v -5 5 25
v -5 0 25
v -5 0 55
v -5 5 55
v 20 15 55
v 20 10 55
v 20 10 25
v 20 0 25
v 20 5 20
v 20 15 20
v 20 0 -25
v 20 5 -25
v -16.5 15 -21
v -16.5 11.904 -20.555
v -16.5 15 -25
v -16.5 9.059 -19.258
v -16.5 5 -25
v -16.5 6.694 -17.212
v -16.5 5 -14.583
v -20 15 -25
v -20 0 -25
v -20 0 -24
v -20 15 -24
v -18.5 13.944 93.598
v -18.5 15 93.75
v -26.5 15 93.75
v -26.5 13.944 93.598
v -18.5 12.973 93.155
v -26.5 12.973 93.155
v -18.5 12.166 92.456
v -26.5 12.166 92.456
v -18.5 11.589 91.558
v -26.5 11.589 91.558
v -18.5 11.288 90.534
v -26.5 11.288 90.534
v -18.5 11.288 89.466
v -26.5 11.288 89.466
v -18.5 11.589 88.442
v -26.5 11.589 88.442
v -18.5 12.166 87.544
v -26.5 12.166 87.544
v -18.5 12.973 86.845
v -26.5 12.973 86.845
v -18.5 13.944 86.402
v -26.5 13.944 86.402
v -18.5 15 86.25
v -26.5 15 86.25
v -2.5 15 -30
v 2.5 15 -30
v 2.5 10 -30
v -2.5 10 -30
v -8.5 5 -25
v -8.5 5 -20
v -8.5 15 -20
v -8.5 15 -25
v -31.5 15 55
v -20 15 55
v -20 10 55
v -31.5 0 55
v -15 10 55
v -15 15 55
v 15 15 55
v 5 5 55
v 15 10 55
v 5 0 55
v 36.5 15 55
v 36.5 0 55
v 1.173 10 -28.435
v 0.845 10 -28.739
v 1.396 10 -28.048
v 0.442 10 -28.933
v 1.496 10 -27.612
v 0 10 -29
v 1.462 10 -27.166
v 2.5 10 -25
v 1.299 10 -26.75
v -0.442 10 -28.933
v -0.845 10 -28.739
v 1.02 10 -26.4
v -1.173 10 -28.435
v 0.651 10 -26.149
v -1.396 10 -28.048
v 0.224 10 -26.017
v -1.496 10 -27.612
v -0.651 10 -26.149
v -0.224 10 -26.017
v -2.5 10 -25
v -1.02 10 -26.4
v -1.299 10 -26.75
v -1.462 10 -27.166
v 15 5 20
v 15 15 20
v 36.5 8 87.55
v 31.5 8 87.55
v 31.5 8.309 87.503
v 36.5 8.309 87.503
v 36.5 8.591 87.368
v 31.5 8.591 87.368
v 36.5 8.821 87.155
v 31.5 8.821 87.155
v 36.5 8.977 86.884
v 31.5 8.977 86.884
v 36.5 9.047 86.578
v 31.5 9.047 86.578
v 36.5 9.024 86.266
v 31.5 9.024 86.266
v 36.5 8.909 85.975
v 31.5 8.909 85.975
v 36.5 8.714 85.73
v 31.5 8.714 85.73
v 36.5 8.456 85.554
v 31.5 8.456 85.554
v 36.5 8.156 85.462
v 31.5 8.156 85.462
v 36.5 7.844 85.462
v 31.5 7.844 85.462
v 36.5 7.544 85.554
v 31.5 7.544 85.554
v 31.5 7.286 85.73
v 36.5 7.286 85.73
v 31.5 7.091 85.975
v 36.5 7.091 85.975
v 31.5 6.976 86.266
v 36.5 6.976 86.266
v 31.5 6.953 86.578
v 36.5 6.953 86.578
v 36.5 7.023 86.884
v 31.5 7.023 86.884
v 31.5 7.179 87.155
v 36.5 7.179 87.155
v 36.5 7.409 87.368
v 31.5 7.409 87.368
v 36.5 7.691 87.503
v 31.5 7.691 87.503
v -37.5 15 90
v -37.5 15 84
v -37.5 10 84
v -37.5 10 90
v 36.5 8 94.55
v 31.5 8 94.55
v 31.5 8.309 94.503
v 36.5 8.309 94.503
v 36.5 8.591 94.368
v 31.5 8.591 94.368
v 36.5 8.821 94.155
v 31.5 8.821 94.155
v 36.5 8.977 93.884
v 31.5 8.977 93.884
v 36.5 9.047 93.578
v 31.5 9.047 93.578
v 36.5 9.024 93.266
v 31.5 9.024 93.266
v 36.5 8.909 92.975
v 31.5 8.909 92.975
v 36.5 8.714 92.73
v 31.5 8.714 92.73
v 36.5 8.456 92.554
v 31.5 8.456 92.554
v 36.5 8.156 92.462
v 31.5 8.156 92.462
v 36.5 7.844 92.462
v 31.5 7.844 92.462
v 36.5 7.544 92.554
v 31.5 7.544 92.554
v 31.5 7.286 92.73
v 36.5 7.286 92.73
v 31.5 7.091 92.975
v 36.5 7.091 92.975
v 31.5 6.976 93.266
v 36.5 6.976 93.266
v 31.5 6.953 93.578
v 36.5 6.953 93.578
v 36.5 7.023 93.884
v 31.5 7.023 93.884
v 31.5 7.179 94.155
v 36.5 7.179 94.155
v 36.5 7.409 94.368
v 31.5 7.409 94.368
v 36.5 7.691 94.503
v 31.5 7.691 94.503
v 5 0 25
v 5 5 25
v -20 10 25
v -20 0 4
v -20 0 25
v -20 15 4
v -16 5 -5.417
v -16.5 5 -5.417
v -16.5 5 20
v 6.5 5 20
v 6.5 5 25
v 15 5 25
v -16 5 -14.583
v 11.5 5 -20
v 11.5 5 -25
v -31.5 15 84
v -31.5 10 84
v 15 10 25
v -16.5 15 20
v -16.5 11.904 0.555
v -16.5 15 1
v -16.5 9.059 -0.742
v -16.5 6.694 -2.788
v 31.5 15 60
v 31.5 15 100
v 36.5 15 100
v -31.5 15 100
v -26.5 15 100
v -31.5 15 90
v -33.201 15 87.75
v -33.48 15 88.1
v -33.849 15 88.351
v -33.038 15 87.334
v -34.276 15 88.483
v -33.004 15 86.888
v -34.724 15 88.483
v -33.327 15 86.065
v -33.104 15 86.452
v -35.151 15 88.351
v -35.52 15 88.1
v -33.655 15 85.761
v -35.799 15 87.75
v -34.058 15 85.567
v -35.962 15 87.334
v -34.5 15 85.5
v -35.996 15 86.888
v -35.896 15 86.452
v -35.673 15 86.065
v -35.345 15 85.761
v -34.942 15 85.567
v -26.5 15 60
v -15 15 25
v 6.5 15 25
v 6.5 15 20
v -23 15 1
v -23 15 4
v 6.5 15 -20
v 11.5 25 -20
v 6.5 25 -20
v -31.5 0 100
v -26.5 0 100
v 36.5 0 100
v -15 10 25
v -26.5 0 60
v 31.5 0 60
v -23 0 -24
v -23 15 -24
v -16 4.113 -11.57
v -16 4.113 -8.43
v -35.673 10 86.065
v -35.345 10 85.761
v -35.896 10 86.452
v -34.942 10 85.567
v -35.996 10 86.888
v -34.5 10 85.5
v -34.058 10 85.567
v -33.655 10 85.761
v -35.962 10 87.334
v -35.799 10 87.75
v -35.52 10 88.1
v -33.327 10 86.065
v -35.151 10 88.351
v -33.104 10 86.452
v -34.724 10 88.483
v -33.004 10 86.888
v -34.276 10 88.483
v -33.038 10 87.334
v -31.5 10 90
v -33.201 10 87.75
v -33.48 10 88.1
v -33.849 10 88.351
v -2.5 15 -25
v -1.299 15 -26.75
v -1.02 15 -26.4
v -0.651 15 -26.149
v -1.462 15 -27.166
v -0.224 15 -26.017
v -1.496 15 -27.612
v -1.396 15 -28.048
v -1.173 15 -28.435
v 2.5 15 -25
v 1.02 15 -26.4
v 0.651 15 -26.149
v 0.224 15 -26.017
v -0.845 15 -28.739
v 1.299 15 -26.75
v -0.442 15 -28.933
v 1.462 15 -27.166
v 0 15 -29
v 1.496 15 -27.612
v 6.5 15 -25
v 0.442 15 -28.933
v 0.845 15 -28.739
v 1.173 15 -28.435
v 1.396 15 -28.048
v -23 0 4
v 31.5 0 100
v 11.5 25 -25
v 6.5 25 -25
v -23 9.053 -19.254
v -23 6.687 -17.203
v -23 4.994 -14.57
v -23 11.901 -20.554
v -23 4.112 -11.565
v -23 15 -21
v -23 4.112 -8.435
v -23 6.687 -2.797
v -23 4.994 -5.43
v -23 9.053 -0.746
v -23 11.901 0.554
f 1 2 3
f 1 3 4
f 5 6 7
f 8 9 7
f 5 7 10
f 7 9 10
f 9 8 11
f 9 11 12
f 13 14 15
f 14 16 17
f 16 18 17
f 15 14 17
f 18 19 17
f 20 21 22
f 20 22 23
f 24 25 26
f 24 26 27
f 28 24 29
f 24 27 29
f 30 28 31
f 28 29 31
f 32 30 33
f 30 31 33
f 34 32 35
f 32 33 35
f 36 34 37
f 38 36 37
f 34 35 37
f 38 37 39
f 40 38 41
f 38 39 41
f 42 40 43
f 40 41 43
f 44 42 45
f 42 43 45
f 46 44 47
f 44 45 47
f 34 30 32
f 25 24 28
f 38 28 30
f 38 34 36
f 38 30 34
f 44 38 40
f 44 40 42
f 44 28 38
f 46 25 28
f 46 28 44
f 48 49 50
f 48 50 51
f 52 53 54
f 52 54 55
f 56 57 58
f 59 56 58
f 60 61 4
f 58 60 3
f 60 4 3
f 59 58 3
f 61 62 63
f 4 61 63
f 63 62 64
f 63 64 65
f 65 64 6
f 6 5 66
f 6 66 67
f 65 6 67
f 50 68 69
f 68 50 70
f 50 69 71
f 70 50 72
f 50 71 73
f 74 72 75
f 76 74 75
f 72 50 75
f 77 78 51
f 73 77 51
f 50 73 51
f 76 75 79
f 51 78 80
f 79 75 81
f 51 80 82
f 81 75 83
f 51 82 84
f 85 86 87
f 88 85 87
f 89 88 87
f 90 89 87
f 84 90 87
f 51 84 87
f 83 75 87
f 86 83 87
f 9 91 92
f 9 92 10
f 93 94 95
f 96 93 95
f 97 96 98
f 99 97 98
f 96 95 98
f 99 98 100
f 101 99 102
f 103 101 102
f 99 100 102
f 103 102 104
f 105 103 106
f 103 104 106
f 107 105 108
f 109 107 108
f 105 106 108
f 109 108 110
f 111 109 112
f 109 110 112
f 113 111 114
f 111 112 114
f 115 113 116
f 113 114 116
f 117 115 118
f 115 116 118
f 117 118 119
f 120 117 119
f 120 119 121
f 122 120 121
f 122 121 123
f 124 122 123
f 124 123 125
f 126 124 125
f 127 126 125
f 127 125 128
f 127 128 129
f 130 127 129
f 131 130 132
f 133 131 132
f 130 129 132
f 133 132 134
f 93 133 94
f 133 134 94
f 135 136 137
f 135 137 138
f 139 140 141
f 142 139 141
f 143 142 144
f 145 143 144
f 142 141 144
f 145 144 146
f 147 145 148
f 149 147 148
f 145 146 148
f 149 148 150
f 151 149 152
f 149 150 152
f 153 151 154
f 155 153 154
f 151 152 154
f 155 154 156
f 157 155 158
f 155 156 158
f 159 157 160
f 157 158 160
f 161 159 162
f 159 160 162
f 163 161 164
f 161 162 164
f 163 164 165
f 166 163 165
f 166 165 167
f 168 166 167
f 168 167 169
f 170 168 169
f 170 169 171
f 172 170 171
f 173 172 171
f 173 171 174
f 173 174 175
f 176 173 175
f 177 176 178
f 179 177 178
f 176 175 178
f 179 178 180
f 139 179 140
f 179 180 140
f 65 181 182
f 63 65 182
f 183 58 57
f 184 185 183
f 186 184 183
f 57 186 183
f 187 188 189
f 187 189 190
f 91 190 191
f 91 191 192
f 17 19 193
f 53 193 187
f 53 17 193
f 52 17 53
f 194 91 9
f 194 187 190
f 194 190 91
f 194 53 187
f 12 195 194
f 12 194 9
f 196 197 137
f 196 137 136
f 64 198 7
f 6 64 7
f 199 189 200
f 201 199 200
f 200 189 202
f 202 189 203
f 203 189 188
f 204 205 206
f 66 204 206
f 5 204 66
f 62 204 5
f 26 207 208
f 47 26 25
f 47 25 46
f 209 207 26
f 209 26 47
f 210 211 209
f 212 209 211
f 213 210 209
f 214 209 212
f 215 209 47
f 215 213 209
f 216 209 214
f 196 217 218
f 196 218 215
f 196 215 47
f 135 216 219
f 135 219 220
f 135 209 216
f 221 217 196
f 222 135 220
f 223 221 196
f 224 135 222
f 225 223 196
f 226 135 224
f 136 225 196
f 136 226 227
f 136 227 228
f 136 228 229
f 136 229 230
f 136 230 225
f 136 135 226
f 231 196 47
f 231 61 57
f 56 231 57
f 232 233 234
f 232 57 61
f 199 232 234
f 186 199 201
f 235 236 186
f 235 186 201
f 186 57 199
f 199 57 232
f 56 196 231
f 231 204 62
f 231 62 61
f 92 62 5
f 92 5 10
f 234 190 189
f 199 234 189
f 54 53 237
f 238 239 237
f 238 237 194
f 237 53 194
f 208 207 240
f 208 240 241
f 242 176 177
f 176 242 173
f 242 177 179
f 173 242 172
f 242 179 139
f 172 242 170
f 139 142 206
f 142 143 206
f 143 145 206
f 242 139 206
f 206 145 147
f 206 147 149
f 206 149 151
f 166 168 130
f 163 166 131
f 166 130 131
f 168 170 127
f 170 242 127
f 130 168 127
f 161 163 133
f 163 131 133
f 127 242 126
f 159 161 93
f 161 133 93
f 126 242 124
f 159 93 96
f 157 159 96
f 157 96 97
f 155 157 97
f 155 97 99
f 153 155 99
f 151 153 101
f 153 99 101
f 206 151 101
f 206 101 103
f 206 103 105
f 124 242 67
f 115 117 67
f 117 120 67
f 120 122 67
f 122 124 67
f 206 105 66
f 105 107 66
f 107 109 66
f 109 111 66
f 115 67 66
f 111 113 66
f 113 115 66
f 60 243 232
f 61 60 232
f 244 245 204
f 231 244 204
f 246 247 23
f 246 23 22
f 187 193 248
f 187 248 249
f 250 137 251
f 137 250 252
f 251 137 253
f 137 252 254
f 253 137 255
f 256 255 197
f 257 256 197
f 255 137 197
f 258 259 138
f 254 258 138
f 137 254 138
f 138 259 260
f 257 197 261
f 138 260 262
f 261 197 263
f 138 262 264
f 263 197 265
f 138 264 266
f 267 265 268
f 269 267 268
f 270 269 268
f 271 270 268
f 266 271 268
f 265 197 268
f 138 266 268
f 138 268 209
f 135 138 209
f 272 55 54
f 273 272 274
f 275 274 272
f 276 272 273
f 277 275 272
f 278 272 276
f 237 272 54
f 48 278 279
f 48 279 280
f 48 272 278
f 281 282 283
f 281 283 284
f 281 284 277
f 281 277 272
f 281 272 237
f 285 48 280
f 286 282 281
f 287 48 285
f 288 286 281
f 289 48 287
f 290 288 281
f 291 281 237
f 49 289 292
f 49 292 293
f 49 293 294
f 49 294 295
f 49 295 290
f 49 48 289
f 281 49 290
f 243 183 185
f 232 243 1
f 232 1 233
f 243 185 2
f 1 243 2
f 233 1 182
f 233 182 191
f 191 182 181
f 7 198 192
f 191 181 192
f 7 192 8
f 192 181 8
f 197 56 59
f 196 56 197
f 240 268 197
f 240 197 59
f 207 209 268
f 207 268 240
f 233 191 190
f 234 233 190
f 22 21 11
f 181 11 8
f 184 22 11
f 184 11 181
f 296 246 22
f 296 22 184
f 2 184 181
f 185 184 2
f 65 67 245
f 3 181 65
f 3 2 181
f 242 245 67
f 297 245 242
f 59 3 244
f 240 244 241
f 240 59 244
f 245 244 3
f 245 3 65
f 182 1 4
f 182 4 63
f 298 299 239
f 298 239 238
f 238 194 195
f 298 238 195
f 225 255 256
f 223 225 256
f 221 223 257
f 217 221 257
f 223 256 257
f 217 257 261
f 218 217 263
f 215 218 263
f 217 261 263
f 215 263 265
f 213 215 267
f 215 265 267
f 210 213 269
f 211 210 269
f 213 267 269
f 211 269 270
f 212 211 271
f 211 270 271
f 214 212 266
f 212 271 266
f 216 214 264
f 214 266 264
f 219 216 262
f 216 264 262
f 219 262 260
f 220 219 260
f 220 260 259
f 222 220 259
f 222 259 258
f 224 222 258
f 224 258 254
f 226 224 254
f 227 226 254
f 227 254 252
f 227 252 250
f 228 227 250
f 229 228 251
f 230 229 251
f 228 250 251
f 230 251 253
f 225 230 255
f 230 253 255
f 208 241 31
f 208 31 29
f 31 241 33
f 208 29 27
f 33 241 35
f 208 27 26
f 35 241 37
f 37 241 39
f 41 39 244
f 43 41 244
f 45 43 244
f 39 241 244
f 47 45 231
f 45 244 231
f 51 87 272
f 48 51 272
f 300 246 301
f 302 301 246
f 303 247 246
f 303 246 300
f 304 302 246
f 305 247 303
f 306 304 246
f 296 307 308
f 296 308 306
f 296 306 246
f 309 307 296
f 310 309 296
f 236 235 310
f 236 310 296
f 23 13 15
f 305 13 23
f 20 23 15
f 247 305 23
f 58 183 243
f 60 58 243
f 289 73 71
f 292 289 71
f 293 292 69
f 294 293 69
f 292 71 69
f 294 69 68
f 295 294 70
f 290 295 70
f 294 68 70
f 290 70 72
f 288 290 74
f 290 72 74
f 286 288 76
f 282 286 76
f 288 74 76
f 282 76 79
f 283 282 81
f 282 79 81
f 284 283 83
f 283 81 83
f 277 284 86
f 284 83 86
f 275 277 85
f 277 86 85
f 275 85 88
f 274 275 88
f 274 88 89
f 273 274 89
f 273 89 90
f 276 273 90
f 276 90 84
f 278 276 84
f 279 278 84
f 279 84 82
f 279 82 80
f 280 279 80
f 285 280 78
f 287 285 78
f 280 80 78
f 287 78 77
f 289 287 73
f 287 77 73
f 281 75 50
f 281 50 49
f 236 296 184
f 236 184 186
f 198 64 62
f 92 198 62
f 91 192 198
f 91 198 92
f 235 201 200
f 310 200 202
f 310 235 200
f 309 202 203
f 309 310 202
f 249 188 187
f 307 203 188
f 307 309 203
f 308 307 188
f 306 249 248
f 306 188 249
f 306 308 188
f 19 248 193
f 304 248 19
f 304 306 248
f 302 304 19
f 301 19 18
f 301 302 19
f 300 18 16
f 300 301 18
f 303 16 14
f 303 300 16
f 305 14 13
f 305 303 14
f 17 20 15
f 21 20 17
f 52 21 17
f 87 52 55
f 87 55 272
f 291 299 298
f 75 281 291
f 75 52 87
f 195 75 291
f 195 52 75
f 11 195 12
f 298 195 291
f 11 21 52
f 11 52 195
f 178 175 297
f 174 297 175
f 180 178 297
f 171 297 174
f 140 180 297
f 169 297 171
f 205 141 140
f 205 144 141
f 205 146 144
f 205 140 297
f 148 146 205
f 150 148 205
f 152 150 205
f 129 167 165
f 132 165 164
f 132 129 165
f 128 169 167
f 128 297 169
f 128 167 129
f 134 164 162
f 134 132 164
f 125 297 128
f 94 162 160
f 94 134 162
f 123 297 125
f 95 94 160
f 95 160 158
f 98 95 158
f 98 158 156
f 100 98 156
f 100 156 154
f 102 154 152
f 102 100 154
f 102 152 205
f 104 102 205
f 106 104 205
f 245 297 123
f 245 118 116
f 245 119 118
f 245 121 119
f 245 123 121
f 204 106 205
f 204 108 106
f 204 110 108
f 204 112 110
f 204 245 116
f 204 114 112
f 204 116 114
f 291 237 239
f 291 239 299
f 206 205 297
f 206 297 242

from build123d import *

# Parameters (mm, degrees)
SKETCH1_W            = 40
SKETCH1_H            = 50
BOSS_EXTRUDE1_DEPTH  = 5
SKETCH3_W            = 5
SKETCH3_H            = 5
BOSS_EXTRUDE5_DEPTH  = 20
SKETCH3_3_W          = 15
SKETCH3_3_H          = 5
SKETCH3_3_W_2        = 5
BOSS_EXTRUDE6_DEPTH  = 10
CUT_EXTRUDE3_DEPTH   = 4
SKETCH11_W           = 5
SKETCH11_H           = 5
BOSS_EXTRUDE10_DEPTH = 5
SKETCH12_R           = 1.5
CUT_EXTRUDE4_DEPTH   = 5
SKETCH14_W           = 10
SKETCH14_H           = 5
SKETCH14_W_2         = 5
BOSS_EXTRUDE12_DEPTH = 30
SKETCH15_W           = 40
SKETCH15_H           = 15
BOSS_EXTRUDE13_DEPTH = 5
BOSS_EXTRUDE15_DEPTH = 16.5
BOSS_EXTRUDE17_DEPTH = 11.5
SKETCH18_W           = 5
SKETCH18_H           = 15
BOSS_EXTRUDE18_DEPTH = 40
BOSS_EXTRUDE19_DEPTH = 8
SKETCH20_W           = 6
SKETCH20_H           = 5
BOSS_EXTRUDE20_DEPTH = 6
SKETCH21_R           = 1.5
CUT_EXTRUDE5_DEPTH   = 5
SKETCH24_R           = 1.05
CUT_EXTRUDE7_DEPTH   = 5
BOSS_EXTRUDE21_START = 3
BOSS_EXTRUDE21_DEPTH = 3


with BuildPart() as part:
    # Sketch1 → Boss-Extrude1 (new body)
    with BuildSketch(Plane(origin=(0, 0, 0), x_dir=(1, 0, 0), z_dir=(0, 1, 0))):
        Rectangle(SKETCH1_W, SKETCH1_H)
    extrude(amount=BOSS_EXTRUDE1_DEPTH)

    # Sketch3 → Boss-Extrude5 (add)
    with BuildSketch(Plane(origin=(0, 5, 0), x_dir=(1, 0, 0), z_dir=(0, 1, 0))):
        with Locations((9, 22.5)):
            Rectangle(SKETCH3_W, SKETCH3_H)
    extrude(amount=BOSS_EXTRUDE5_DEPTH)

    # Sketch3<3> → Boss-Extrude6 (add)
    with BuildSketch(Plane(origin=(0, 5, 0), x_dir=(1, 0, 0), z_dir=(0, 1, 0))):
        with Locations((-1, 22.5)):
            Rectangle(SKETCH3_3_W, SKETCH3_3_H)
        with Locations((17.5, -22.5)):
            Rectangle(SKETCH3_3_W_2, SKETCH3_3_H)
        Polygon((-16.5, -20), (-16.5, 25), (-20, 25), (-20, -25), (6.5, -25), (6.5, -20), align=None)
    extrude(amount=BOSS_EXTRUDE6_DEPTH)

    # Sketch8 → Cut-Extrude3 (cut)
    with BuildSketch(Plane.ZY.offset(20)):
        with BuildLine():
            Line((1, 15), (-21, 15))
            ThreePointArc((-21, 15), (-10, 4), (1, 15))
        make_face()
    extrude(amount=-CUT_EXTRUDE3_DEPTH, mode=Mode.SUBTRACT)

    # Sketch11 → Boss-Extrude10 (add)
    with BuildSketch(Plane(origin=(0, 0, -25), x_dir=(-1, 0, 0), z_dir=(0, 0, -1))):
        with Locations((0, 12.5)):
            Rectangle(SKETCH11_W, SKETCH11_H)
    extrude(amount=BOSS_EXTRUDE10_DEPTH)

    # Sketch12 → Cut-Extrude4 (cut)
    with BuildSketch(Plane.XZ.offset(-10)):
        with Locations((0, -27.5)):
            Circle(SKETCH12_R)
    extrude(amount=-CUT_EXTRUDE4_DEPTH, mode=Mode.SUBTRACT)

    # Sketch14 → Boss-Extrude12 (add)
    with BuildSketch(Plane.XY.offset(25)):
        with Locations((0, 2.5)):
            Rectangle(SKETCH14_W, SKETCH14_H)
        with Locations((-17.5, 12.5)):
            Rectangle(SKETCH14_W_2, SKETCH14_H)
        with Locations((17.5, 12.5)):
            Rectangle(SKETCH14_W_2, SKETCH14_H)
    extrude(amount=BOSS_EXTRUDE12_DEPTH)

    # Sketch15 → Boss-Extrude13 (add)
    with BuildSketch(Plane.XY.offset(55)):
        with Locations((0, 7.5)):
            Rectangle(SKETCH15_W, SKETCH15_H)
    extrude(amount=BOSS_EXTRUDE13_DEPTH)

    # Sketch16 → Boss-Extrude15 (add)
    with BuildSketch(Plane(origin=(20, 0, 0), x_dir=(0, 0, -1), z_dir=(1, 0, 0))):
        Polygon((-60, 0), (-55, 0), (-55, 10), (-55, 15), (-60, 15), align=None)
    extrude(amount=BOSS_EXTRUDE15_DEPTH)

    # Sketch17 → Boss-Extrude17 (add)
    with BuildSketch(Plane.ZY.offset(20)):
        Polygon((55, 0), (60, 0), (60, 15), (55, 15), (55, 10), align=None)
    extrude(amount=BOSS_EXTRUDE17_DEPTH)

    # Sketch18 → Boss-Extrude18 (add)
    with BuildSketch(Plane.XY.offset(60)):
        with Locations((34, 7.5)):
            Rectangle(SKETCH18_W, SKETCH18_H)
        with Locations((-29, 7.5)):
            Rectangle(SKETCH18_W, SKETCH18_H)
    extrude(amount=BOSS_EXTRUDE18_DEPTH)

    # Sketch19 → Boss-Extrude19 (add)
    with BuildSketch(Plane(origin=(-26.5, 0, 0), x_dir=(0, 0, -1), z_dir=(1, 0, 0))):
        with BuildLine():
            Line((-86.25, 15), (-93.75, 15))
            ThreePointArc((-93.75, 15), (-90, 11.25), (-86.25, 15))
        make_face()
    extrude(amount=BOSS_EXTRUDE19_DEPTH)

    # Sketch20 → Boss-Extrude20 (add)
    with BuildSketch(Plane.ZY.offset(31.5)):
        with Locations((87, 12.5)):
            Rectangle(SKETCH20_W, SKETCH20_H)
    extrude(amount=BOSS_EXTRUDE20_DEPTH)

    # Sketch21 → Cut-Extrude5 (cut)
    with BuildSketch(Plane.XZ.offset(-10)):
        with Locations((-34.5, 87)):
            Circle(SKETCH21_R)
    extrude(amount=-CUT_EXTRUDE5_DEPTH, mode=Mode.SUBTRACT)

    # Sketch24 → Cut-Extrude7 (cut)
    with BuildSketch(Plane.ZY.offset(-31.5)):
        with Locations((93.5, 8)):
            Circle(SKETCH24_R)
        with Locations((86.5, 8)):
            Circle(SKETCH24_R)
    extrude(amount=-CUT_EXTRUDE7_DEPTH, mode=Mode.SUBTRACT)

    # Sketch25 → Boss-Extrude21 (add)
    with BuildSketch(Plane.ZY.offset(20).offset(BOSS_EXTRUDE21_START)):
        with BuildLine():
            Line((-21, 15), (-24, 15))
            Line((-24, 15), (-24, 0))
            Line((-24, 0), (4, 0))
            Line((4, 0), (4, 15))
            Line((4, 15), (1, 15))
            ThreePointArc((1, 15), (-10, 4), (-21, 15))
        make_face()
    extrude(amount=-BOSS_EXTRUDE21_DEPTH)


solid = part.part
